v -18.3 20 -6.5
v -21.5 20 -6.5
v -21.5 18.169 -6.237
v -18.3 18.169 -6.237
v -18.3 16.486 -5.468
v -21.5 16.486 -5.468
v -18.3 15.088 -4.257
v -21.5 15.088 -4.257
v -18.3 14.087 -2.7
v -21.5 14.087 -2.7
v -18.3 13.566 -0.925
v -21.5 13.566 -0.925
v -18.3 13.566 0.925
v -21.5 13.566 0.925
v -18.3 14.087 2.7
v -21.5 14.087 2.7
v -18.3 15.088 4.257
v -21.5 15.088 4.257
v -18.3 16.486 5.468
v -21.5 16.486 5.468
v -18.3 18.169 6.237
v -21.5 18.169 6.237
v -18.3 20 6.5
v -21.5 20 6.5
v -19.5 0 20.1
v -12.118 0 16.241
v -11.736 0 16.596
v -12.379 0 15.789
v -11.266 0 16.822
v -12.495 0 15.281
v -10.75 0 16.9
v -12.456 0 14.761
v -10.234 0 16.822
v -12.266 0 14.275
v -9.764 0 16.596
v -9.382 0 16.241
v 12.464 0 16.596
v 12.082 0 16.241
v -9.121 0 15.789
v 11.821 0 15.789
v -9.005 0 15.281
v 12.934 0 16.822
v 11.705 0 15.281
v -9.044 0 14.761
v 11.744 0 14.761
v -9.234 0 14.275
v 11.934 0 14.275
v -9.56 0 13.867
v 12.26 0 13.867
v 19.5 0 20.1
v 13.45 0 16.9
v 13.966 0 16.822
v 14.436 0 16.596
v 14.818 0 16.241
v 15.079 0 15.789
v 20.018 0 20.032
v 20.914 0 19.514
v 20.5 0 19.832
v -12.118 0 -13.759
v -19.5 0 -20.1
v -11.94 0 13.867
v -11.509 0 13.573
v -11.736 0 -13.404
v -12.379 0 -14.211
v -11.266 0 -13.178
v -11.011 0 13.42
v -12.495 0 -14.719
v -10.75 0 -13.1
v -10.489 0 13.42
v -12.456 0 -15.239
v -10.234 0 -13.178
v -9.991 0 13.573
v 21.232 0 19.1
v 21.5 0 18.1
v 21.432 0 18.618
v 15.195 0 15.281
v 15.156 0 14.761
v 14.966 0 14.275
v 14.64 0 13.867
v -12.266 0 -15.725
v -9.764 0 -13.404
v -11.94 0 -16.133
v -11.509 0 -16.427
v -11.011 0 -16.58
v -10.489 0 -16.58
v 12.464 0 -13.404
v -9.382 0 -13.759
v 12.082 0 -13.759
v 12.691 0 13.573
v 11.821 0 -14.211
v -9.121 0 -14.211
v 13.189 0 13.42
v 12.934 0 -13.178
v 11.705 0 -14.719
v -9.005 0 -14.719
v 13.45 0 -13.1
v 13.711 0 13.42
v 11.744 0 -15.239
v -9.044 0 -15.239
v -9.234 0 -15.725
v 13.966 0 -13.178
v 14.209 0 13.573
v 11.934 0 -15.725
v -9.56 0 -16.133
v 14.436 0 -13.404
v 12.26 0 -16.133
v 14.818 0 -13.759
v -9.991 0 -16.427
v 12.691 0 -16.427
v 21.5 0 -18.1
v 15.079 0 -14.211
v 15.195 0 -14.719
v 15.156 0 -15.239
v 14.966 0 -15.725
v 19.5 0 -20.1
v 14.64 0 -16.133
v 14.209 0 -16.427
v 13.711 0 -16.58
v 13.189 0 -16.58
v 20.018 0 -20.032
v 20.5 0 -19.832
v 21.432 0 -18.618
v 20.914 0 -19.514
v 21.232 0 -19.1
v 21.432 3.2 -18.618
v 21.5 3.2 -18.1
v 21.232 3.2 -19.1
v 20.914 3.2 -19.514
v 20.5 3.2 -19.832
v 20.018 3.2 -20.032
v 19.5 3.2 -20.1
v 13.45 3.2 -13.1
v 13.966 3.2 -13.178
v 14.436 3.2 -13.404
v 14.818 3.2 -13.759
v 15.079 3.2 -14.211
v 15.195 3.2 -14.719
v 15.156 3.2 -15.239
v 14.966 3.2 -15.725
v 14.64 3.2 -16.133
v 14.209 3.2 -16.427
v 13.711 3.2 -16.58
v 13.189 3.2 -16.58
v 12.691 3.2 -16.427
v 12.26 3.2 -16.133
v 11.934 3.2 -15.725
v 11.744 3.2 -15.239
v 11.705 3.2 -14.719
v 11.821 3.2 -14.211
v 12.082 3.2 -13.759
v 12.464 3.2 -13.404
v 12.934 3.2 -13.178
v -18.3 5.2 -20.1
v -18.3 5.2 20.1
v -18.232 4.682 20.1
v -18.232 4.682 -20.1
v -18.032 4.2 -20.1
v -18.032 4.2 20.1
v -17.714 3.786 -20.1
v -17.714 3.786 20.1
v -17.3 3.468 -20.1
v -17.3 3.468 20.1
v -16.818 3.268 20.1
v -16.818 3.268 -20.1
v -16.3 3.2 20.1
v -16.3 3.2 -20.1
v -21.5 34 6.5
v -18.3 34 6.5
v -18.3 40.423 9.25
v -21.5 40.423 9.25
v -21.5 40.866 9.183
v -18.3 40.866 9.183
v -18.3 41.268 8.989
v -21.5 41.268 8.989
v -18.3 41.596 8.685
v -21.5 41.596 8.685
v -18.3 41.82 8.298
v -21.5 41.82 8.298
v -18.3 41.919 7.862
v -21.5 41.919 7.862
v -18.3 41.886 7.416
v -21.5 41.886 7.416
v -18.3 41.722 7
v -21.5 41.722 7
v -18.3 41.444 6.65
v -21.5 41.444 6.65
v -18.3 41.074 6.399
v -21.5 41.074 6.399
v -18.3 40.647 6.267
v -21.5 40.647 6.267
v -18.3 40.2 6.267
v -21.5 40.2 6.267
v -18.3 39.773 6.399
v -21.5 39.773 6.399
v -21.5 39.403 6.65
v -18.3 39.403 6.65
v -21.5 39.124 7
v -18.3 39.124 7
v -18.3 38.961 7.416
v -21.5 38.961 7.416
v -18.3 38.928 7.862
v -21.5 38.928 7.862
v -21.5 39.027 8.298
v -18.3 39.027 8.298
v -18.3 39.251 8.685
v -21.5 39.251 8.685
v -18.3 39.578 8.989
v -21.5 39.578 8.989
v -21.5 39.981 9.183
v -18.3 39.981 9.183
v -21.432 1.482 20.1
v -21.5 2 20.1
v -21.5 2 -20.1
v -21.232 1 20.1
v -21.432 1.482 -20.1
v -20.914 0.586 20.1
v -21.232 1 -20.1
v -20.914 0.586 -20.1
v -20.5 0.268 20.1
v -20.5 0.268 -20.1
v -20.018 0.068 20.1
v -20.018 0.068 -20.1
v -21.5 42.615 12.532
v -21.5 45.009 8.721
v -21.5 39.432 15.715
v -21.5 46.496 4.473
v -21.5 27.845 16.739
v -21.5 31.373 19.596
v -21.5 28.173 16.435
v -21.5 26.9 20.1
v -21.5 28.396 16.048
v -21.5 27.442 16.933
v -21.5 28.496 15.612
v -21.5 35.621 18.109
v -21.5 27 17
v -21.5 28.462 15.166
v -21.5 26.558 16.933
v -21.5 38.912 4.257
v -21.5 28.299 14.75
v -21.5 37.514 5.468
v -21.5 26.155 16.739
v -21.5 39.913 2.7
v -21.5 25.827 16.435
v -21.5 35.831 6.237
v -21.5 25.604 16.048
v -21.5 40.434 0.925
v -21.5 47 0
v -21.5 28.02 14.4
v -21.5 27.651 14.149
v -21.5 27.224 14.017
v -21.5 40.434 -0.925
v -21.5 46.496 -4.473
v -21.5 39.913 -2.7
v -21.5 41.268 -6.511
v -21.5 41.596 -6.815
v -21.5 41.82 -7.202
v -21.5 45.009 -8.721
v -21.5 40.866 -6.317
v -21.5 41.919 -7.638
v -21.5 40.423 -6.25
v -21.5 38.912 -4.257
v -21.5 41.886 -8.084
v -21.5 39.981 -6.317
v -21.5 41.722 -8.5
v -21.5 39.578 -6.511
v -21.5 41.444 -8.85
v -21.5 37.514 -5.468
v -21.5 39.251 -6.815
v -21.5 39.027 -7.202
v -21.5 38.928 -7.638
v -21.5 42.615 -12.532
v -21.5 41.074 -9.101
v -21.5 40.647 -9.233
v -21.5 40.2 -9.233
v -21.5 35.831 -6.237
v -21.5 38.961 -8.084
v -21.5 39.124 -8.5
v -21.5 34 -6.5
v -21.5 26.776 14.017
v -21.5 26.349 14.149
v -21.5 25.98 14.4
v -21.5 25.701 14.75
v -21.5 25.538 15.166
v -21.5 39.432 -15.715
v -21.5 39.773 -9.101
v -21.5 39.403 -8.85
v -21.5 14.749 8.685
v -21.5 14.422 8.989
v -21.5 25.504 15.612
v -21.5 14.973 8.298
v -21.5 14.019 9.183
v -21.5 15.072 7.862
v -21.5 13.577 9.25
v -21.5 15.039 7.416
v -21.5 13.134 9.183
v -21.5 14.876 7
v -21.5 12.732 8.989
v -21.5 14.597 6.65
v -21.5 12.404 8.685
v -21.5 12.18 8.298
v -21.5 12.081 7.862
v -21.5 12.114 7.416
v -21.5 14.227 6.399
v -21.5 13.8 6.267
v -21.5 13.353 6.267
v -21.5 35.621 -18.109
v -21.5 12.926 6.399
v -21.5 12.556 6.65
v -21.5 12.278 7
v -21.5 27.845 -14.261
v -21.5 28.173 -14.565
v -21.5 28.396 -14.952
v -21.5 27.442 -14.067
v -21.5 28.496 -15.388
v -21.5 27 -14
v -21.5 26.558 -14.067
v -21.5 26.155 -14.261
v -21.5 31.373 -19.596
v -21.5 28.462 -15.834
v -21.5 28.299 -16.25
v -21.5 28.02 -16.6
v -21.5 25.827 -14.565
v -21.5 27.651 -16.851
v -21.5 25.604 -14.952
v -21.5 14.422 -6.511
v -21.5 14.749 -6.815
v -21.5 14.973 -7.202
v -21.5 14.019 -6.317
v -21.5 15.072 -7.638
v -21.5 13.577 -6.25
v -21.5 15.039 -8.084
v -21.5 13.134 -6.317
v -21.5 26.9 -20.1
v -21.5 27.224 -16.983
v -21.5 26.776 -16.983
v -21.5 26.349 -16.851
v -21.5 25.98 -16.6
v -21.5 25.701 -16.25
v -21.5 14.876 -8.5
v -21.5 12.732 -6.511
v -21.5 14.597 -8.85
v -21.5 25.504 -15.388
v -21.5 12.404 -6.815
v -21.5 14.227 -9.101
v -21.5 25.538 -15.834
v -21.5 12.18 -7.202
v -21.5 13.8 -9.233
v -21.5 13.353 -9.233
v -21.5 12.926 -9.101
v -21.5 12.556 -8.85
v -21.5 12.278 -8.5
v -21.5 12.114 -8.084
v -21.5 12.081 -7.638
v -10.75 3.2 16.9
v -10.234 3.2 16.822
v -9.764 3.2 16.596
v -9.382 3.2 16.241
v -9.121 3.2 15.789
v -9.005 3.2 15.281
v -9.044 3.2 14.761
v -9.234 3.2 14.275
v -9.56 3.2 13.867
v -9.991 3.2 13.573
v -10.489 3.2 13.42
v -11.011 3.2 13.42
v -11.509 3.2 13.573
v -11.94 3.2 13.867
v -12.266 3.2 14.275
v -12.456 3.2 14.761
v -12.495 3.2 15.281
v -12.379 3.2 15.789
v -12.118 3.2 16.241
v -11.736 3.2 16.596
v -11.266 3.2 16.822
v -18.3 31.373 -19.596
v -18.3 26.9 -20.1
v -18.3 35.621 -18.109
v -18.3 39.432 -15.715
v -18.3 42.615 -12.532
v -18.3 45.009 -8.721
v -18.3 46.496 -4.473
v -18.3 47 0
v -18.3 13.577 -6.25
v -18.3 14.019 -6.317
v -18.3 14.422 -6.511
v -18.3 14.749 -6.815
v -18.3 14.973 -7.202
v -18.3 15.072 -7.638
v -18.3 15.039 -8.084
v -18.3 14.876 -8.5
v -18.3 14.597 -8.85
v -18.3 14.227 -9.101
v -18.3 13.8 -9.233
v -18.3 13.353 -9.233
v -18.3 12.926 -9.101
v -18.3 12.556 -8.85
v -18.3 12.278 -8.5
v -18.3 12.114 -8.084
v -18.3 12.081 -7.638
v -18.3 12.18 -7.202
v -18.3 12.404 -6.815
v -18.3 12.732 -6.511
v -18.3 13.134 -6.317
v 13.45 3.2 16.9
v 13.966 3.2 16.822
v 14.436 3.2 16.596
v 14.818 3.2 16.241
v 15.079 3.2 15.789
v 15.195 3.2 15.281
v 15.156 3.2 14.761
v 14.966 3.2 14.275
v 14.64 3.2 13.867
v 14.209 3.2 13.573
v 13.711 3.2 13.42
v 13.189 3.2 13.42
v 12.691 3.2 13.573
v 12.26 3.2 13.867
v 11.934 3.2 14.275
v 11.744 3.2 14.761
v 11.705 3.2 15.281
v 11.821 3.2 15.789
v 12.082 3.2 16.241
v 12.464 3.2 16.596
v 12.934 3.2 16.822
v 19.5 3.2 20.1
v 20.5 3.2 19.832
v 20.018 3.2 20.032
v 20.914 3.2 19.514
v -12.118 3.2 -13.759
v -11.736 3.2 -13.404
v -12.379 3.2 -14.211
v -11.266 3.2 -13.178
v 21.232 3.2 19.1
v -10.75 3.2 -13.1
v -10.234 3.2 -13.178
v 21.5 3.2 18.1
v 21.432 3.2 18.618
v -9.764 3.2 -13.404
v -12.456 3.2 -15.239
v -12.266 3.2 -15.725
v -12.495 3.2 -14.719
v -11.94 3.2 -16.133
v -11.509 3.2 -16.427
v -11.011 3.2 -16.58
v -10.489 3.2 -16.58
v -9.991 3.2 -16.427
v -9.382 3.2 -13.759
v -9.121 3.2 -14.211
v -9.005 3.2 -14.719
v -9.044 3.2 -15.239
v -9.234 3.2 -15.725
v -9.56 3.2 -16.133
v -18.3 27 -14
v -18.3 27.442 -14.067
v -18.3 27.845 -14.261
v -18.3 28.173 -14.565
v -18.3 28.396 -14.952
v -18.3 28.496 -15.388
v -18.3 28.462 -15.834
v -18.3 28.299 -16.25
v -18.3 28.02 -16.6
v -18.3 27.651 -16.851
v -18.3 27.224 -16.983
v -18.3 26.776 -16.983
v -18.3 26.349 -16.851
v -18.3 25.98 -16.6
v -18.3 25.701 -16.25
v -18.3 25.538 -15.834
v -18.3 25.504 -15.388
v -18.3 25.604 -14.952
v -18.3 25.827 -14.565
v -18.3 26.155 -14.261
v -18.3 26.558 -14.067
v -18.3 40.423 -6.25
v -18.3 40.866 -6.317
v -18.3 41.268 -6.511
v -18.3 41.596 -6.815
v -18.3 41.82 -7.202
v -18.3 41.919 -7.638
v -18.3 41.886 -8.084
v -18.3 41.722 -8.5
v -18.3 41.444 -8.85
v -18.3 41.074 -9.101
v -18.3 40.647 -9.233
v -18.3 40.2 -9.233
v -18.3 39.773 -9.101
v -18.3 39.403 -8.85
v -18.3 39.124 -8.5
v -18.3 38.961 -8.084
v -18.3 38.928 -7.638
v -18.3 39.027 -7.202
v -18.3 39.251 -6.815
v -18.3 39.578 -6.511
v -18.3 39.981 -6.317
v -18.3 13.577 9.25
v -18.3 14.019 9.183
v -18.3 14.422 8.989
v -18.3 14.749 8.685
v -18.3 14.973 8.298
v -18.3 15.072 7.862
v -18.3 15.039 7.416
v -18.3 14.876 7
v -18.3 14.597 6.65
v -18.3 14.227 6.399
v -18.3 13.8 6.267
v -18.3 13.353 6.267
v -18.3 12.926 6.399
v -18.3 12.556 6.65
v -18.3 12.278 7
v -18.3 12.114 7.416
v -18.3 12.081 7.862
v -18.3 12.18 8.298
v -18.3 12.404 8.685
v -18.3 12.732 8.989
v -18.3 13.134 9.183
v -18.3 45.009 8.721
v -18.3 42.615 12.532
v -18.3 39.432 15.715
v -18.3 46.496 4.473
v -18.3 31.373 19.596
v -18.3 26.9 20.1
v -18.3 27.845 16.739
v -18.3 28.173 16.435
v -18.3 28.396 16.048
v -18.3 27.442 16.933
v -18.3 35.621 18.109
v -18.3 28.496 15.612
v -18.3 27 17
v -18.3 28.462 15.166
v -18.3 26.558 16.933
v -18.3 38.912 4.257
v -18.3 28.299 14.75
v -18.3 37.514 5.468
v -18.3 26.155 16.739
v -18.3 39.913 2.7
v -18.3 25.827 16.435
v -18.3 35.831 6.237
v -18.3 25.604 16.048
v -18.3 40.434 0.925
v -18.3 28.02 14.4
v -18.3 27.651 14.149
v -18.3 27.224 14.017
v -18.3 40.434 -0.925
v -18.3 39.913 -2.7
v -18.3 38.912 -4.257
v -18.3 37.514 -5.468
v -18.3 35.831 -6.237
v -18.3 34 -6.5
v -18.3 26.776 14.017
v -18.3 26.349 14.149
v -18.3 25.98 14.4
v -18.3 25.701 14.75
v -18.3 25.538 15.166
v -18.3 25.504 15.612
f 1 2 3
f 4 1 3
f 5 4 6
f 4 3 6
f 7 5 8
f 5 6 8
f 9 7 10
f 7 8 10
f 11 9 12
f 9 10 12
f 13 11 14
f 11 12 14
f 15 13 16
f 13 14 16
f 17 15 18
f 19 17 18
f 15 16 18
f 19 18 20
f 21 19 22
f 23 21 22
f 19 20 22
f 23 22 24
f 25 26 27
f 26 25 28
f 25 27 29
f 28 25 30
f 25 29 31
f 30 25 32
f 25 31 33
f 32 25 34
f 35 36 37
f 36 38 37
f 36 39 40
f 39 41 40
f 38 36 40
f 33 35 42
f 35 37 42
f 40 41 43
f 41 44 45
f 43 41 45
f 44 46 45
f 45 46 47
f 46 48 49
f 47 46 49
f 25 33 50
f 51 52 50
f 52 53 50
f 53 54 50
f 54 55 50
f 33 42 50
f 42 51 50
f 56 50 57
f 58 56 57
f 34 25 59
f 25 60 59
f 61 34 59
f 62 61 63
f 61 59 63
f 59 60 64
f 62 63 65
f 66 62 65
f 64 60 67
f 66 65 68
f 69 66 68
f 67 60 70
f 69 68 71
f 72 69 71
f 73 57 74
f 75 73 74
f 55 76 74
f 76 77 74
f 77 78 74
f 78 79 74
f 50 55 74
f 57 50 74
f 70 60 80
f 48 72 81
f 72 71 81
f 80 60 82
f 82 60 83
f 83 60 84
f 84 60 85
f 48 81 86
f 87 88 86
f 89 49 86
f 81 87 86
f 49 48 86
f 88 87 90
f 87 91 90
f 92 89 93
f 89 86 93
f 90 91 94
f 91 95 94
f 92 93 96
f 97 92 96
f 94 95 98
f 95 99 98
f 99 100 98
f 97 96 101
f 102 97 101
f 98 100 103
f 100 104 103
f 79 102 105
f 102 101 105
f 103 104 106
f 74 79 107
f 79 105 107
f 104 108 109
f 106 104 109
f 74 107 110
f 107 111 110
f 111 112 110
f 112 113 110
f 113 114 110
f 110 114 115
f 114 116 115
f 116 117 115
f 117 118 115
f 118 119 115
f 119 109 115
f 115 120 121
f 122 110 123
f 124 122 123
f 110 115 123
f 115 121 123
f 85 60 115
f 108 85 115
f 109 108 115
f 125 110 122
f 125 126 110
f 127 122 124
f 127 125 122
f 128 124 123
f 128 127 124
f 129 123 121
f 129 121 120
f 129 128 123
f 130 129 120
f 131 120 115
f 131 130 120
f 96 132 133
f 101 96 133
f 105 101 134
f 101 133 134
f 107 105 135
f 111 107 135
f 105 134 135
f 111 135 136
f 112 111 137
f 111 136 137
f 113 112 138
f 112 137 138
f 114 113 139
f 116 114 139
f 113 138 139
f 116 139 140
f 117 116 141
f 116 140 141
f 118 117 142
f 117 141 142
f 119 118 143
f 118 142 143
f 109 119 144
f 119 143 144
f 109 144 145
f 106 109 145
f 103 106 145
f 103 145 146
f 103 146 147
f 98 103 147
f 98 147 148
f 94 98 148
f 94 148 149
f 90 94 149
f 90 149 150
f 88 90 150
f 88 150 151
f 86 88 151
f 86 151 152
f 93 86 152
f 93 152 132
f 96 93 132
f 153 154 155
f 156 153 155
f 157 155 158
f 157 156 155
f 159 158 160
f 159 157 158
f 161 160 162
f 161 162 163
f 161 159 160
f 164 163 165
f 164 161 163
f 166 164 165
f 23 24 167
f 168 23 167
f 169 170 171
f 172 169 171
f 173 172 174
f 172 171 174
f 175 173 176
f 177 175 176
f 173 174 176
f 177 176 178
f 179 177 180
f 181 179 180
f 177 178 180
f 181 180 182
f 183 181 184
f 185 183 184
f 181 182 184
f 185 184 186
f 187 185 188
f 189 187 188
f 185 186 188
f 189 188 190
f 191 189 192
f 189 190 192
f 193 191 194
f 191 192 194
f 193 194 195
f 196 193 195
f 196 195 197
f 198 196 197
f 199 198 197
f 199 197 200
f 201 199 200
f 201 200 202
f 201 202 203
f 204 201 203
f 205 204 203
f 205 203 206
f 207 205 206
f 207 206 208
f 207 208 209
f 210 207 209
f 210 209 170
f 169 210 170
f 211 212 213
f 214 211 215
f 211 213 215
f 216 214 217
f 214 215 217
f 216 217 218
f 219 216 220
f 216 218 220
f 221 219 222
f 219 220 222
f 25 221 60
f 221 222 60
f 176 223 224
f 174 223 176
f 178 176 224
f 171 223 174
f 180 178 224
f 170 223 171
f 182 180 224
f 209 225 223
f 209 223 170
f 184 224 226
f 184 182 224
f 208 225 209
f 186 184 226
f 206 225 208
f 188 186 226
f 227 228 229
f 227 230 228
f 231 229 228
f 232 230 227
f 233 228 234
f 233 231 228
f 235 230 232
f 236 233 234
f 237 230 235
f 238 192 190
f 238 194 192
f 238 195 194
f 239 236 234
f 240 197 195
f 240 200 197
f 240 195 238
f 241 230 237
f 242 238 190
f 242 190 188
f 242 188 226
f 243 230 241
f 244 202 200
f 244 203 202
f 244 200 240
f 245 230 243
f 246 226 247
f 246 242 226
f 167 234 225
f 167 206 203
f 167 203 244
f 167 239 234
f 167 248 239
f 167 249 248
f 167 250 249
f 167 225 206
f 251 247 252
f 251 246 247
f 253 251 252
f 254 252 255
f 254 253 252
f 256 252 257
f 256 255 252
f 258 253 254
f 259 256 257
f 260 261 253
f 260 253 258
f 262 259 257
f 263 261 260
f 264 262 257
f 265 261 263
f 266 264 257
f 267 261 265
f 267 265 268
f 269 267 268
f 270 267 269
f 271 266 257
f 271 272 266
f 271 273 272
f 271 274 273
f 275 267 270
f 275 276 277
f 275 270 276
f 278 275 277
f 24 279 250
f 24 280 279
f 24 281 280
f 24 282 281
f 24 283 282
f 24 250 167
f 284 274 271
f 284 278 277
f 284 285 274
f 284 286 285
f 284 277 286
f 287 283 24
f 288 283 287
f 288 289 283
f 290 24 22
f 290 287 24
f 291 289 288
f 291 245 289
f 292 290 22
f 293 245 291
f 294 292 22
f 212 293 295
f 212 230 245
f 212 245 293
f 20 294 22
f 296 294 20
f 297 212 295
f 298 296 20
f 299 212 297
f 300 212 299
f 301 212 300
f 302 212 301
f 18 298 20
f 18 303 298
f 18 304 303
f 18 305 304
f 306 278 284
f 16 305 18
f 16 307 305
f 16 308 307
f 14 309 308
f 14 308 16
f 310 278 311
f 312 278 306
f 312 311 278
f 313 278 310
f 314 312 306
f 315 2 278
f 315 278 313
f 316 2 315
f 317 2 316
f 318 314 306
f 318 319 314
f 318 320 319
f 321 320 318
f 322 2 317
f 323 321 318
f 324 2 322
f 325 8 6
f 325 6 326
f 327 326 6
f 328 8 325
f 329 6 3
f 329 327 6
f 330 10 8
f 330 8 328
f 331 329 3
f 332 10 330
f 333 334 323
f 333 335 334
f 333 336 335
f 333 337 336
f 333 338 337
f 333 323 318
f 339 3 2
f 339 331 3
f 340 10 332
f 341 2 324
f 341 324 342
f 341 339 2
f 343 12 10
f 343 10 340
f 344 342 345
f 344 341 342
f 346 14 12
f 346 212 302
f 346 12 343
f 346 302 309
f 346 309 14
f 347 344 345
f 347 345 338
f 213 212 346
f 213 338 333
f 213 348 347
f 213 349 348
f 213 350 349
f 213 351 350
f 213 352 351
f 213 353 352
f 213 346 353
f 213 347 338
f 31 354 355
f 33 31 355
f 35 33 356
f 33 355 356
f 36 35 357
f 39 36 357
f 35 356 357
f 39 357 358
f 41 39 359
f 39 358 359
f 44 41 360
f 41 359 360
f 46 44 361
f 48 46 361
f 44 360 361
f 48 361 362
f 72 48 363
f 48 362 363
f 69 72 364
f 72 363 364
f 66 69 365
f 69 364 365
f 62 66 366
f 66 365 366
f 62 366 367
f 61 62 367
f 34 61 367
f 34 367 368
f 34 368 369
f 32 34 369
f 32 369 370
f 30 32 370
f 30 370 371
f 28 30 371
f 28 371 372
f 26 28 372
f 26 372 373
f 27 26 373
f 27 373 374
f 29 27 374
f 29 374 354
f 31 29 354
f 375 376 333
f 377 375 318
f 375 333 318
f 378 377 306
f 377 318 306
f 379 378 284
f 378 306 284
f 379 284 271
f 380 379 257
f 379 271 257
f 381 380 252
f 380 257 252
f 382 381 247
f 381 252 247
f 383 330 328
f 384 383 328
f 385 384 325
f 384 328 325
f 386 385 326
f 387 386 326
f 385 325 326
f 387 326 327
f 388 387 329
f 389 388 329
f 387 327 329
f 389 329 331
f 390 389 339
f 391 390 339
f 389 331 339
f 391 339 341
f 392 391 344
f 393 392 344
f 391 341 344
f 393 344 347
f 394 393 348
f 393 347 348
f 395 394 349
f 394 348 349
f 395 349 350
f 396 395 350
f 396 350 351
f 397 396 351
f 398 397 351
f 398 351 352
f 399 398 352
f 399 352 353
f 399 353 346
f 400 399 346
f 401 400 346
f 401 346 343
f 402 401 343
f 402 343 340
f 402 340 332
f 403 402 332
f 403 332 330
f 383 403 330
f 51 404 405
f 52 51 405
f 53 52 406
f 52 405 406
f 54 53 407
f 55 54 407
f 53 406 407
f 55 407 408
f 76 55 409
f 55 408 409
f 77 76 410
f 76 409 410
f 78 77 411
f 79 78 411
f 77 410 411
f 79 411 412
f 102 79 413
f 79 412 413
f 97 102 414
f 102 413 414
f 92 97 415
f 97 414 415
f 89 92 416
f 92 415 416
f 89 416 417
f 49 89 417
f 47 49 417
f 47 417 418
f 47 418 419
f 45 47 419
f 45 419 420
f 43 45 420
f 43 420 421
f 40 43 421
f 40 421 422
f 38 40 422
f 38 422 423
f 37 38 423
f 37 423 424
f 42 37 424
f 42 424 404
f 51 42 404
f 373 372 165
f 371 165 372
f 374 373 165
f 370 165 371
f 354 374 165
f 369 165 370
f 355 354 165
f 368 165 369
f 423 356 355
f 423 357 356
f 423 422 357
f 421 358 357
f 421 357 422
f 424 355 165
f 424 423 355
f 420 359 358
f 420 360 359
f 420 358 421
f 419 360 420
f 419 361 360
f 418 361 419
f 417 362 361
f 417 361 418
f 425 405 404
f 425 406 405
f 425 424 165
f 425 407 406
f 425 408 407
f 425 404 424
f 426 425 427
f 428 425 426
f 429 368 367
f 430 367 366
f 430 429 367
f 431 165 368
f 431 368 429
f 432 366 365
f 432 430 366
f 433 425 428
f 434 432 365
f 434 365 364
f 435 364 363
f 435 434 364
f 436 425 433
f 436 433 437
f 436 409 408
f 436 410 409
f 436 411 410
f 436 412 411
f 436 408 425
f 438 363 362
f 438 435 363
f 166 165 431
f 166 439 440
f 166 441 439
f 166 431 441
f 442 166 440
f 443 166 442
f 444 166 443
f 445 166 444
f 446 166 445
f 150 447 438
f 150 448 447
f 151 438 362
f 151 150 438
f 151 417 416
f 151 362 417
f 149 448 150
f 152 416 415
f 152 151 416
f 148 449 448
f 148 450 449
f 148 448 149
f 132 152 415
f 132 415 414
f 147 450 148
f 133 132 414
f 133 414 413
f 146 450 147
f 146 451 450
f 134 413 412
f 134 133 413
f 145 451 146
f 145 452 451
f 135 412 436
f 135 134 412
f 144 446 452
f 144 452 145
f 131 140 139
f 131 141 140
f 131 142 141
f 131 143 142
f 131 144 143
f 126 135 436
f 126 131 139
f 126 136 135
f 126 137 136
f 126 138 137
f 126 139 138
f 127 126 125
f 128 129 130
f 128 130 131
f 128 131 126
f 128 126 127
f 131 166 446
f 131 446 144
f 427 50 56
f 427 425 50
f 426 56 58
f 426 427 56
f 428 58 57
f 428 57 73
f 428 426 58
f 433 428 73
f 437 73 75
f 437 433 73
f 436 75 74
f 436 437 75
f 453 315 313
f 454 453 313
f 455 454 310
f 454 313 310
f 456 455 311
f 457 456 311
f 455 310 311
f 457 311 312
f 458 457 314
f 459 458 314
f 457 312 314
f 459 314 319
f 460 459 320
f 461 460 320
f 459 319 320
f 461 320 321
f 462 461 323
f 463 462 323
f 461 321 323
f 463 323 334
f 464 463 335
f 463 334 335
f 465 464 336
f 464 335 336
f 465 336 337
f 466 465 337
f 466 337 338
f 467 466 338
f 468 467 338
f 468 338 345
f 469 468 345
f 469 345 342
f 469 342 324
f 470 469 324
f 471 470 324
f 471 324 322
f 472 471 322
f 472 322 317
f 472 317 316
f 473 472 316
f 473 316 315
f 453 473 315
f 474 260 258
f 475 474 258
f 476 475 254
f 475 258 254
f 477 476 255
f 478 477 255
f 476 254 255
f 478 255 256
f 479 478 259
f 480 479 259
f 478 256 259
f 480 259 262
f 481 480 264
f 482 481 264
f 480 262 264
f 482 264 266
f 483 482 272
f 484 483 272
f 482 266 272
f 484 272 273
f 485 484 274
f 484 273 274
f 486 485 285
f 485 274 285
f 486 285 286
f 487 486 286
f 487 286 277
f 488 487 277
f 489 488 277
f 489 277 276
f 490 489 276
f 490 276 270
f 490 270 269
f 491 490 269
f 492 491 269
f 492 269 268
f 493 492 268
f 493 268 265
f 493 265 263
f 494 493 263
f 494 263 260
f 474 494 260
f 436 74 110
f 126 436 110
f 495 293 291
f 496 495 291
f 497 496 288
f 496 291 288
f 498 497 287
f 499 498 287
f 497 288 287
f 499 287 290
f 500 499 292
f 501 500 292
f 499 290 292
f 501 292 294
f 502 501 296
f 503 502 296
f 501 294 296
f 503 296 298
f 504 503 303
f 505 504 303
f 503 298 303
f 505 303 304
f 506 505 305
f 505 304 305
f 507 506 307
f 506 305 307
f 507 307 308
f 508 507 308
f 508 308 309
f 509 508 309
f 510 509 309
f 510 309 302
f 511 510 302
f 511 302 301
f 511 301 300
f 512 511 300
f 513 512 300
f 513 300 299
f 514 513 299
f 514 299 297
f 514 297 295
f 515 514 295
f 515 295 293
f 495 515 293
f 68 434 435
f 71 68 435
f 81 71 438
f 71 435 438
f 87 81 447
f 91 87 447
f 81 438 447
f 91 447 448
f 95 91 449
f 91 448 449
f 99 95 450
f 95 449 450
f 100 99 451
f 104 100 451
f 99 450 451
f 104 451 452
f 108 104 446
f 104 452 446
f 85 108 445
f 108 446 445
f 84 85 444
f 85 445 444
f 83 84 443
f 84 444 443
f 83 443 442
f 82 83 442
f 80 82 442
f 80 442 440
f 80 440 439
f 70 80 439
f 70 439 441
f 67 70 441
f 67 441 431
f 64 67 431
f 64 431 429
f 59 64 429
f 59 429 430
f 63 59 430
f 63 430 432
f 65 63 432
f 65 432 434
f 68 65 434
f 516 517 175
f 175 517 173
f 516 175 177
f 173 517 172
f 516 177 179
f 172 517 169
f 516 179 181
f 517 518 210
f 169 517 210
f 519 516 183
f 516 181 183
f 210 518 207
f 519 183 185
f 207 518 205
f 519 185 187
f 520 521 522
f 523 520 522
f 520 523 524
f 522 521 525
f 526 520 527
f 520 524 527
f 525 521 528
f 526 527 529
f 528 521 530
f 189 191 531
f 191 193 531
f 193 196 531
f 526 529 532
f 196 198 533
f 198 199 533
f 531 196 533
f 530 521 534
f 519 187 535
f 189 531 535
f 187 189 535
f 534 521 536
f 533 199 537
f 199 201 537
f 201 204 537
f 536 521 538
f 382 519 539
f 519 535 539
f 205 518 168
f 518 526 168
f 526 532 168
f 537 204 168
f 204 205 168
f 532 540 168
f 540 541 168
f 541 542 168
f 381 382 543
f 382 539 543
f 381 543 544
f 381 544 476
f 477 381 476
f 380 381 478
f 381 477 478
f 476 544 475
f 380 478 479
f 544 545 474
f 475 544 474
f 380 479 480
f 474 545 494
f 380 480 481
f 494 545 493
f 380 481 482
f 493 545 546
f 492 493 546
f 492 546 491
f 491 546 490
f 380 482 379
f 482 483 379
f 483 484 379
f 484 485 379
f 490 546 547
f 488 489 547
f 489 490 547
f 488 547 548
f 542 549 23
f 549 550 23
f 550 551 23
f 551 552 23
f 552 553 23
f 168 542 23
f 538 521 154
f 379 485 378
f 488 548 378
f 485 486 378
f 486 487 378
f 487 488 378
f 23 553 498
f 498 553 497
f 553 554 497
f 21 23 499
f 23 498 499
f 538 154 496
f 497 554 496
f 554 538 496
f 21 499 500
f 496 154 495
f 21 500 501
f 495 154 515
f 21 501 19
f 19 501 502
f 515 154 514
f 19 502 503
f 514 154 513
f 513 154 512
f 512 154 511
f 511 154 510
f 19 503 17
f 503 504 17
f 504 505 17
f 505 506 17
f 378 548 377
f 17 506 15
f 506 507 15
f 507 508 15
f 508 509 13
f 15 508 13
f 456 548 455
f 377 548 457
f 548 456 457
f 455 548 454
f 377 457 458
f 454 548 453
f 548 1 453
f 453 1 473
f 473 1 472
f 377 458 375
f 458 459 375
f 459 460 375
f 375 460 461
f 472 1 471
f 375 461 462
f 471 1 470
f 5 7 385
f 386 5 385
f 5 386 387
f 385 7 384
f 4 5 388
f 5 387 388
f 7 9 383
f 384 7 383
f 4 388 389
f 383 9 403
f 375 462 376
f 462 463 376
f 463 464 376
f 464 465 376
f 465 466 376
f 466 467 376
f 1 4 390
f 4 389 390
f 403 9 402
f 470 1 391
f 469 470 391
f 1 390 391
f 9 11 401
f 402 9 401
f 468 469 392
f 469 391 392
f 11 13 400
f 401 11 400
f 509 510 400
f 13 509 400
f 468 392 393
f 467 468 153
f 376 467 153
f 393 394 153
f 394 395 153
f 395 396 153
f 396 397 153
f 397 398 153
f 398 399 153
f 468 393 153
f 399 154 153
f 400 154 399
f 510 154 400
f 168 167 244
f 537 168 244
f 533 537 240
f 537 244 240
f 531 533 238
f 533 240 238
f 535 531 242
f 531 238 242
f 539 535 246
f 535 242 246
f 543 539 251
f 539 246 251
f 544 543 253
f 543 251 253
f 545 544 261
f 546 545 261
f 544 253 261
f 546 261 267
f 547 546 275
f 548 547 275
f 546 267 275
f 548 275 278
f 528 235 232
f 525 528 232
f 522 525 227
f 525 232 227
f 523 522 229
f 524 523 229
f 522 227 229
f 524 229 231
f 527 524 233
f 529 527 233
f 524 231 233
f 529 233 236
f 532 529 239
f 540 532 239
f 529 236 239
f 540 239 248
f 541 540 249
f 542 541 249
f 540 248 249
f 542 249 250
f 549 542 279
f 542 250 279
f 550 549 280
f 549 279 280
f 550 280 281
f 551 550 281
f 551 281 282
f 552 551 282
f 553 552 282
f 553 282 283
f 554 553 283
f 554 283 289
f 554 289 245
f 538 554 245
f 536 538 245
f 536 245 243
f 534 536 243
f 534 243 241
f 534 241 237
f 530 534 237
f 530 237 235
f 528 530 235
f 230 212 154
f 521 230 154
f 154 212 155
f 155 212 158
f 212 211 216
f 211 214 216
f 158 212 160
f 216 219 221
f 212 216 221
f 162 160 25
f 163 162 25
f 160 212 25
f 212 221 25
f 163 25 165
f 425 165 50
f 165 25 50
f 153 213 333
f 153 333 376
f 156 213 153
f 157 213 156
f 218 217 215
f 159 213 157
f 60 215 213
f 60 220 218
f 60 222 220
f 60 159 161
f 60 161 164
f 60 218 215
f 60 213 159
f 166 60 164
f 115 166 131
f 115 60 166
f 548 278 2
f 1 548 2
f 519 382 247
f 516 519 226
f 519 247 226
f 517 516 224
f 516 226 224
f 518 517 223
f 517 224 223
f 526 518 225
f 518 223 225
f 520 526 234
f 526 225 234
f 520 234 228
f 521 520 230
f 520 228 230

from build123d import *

# Parameters (mm, degrees)
SKETCH_1_W          = 43
SKETCH_1_H          = 40.2
EXTRUDE_1_DEPTH     = 3.2
SKETCH_2_W          = 3.2
SKETCH_2_H          = 40.2
EXTRUDE_2_DEPTH     = 43.8
SKETCH_3_R          = 1.5
CUT_EXTRUDE_1_DEPTH = 43.8
CUT_EXTRUDE_2_DEPTH = 43.8
FILLET_1_R          = 2
FILLET_2_R          = 2
SKETCH_5_R          = 1.75
CUT_EXTRUDE_3_DEPTH = 43.8
FILLET_3_R          = 2


with BuildPart() as part:
    # 草图1 → 凸台-拉伸1 (new body)
    with BuildSketch(Plane(origin=(0, 0, 0), x_dir=(1, 0, 0), z_dir=(0, 1, 0))):
        Rectangle(SKETCH_1_W, SKETCH_1_H)
    extrude(amount=EXTRUDE_1_DEPTH)

    # 草图2 → 凸台-拉伸2 (add)
    with BuildSketch(Plane(origin=(0, 3.2, 0), x_dir=(1, 0, 0), z_dir=(0, 1, 0))):
        with Locations((-19.9, 0)):
            Rectangle(SKETCH_2_W, SKETCH_2_H)
    extrude(amount=EXTRUDE_2_DEPTH)

    # 草图3 → 切除-拉伸1 (cut)
    with BuildSketch(Plane.ZY.offset(21.5)):
        with Locations((-15.5, 27)):
            Circle(SKETCH_3_R)
        with Locations((-7.75, 40.423393759)):
            Circle(SKETCH_3_R)
        with Locations((7.75, 40.423393759)):
            Circle(SKETCH_3_R)
        with Locations((15.5, 27)):
            Circle(SKETCH_3_R)
        with Locations((7.75, 13.576606241)):
            Circle(SKETCH_3_R)
        with Locations((-7.75, 13.576606241)):
            Circle(SKETCH_3_R)
        with BuildLine():
            Line((-6.5, 34), (-6.5, 20))
            ThreePointArc((-6.5, 20), (0, 13.5), (6.5, 20))
            Line((6.5, 20), (6.5, 34))
            ThreePointArc((6.5, 34), (0, 40.5), (-6.5, 34))
        make_face()
    extrude(amount=-CUT_EXTRUDE_1_DEPTH, mode=Mode.SUBTRACT)

    # 草图4 → 切除-拉伸2 (cut)
    with BuildSketch(Plane.ZY.offset(21.5)):
        with BuildLine():
            Line((-20.1, 47), (-20.1, 26.9))
            ThreePointArc((-20.1, 26.9), (-14.21284635, 41.112846253), (-1.37e-07, 47))
            Line((-1.37e-07, 47), (-20.1, 47))
        make_face()
        with BuildLine():
            ThreePointArc((-1.37e-07, 47), (14.212846253, 41.11284635), (20.1, 26.9))
            Line((20.1, 26.9), (20.1, 47))
            Line((20.1, 47), (-1.37e-07, 47))
        make_face()
    extrude(amount=-CUT_EXTRUDE_2_DEPTH, mode=Mode.SUBTRACT)

    # 圆角1
    fillet_1_edges = [part.edges().sort_by_distance(p)[0] for p in [
        (-21.5, 0, 0),
    ]]
    fillet(fillet_1_edges, radius=FILLET_1_R)

    # 圆角2
    fillet_2_edges = [part.edges().sort_by_distance(p)[0] for p in [
        (-18.3, 3.2, 0),
    ]]
    fillet(fillet_2_edges, radius=FILLET_2_R)

    # 草图5 → 切除-拉伸3 (cut)
    with BuildSketch(Plane(origin=(0, 3.2, 0), x_dir=(1, 0, 0), z_dir=(0, 1, 0))):
        with Locations(Location((13.45, 14.85, 0), (0, 0, 270))):
            Circle(SKETCH_5_R)
        with Locations(Location((13.45, -15.15, 0), (0, 0, 270))):
            Circle(SKETCH_5_R)
        with Locations(Location((-10.75, -15.15, 0), (0, 0, 270))):
            Circle(SKETCH_5_R)
        with Locations(Location((-10.75, 14.85, 0), (0, 0, 270))):
            Circle(SKETCH_5_R)
    extrude(amount=-CUT_EXTRUDE_3_DEPTH, mode=Mode.SUBTRACT)

    # 圆角3
    fillet_3_edges = [part.edges().sort_by_distance(p)[0] for p in [
        (21.5, 1.6, -20.1),
        (21.5, 1.6, 20.1),
    ]]
    fillet(fillet_3_edges, radius=FILLET_3_R)


solid = part.part
